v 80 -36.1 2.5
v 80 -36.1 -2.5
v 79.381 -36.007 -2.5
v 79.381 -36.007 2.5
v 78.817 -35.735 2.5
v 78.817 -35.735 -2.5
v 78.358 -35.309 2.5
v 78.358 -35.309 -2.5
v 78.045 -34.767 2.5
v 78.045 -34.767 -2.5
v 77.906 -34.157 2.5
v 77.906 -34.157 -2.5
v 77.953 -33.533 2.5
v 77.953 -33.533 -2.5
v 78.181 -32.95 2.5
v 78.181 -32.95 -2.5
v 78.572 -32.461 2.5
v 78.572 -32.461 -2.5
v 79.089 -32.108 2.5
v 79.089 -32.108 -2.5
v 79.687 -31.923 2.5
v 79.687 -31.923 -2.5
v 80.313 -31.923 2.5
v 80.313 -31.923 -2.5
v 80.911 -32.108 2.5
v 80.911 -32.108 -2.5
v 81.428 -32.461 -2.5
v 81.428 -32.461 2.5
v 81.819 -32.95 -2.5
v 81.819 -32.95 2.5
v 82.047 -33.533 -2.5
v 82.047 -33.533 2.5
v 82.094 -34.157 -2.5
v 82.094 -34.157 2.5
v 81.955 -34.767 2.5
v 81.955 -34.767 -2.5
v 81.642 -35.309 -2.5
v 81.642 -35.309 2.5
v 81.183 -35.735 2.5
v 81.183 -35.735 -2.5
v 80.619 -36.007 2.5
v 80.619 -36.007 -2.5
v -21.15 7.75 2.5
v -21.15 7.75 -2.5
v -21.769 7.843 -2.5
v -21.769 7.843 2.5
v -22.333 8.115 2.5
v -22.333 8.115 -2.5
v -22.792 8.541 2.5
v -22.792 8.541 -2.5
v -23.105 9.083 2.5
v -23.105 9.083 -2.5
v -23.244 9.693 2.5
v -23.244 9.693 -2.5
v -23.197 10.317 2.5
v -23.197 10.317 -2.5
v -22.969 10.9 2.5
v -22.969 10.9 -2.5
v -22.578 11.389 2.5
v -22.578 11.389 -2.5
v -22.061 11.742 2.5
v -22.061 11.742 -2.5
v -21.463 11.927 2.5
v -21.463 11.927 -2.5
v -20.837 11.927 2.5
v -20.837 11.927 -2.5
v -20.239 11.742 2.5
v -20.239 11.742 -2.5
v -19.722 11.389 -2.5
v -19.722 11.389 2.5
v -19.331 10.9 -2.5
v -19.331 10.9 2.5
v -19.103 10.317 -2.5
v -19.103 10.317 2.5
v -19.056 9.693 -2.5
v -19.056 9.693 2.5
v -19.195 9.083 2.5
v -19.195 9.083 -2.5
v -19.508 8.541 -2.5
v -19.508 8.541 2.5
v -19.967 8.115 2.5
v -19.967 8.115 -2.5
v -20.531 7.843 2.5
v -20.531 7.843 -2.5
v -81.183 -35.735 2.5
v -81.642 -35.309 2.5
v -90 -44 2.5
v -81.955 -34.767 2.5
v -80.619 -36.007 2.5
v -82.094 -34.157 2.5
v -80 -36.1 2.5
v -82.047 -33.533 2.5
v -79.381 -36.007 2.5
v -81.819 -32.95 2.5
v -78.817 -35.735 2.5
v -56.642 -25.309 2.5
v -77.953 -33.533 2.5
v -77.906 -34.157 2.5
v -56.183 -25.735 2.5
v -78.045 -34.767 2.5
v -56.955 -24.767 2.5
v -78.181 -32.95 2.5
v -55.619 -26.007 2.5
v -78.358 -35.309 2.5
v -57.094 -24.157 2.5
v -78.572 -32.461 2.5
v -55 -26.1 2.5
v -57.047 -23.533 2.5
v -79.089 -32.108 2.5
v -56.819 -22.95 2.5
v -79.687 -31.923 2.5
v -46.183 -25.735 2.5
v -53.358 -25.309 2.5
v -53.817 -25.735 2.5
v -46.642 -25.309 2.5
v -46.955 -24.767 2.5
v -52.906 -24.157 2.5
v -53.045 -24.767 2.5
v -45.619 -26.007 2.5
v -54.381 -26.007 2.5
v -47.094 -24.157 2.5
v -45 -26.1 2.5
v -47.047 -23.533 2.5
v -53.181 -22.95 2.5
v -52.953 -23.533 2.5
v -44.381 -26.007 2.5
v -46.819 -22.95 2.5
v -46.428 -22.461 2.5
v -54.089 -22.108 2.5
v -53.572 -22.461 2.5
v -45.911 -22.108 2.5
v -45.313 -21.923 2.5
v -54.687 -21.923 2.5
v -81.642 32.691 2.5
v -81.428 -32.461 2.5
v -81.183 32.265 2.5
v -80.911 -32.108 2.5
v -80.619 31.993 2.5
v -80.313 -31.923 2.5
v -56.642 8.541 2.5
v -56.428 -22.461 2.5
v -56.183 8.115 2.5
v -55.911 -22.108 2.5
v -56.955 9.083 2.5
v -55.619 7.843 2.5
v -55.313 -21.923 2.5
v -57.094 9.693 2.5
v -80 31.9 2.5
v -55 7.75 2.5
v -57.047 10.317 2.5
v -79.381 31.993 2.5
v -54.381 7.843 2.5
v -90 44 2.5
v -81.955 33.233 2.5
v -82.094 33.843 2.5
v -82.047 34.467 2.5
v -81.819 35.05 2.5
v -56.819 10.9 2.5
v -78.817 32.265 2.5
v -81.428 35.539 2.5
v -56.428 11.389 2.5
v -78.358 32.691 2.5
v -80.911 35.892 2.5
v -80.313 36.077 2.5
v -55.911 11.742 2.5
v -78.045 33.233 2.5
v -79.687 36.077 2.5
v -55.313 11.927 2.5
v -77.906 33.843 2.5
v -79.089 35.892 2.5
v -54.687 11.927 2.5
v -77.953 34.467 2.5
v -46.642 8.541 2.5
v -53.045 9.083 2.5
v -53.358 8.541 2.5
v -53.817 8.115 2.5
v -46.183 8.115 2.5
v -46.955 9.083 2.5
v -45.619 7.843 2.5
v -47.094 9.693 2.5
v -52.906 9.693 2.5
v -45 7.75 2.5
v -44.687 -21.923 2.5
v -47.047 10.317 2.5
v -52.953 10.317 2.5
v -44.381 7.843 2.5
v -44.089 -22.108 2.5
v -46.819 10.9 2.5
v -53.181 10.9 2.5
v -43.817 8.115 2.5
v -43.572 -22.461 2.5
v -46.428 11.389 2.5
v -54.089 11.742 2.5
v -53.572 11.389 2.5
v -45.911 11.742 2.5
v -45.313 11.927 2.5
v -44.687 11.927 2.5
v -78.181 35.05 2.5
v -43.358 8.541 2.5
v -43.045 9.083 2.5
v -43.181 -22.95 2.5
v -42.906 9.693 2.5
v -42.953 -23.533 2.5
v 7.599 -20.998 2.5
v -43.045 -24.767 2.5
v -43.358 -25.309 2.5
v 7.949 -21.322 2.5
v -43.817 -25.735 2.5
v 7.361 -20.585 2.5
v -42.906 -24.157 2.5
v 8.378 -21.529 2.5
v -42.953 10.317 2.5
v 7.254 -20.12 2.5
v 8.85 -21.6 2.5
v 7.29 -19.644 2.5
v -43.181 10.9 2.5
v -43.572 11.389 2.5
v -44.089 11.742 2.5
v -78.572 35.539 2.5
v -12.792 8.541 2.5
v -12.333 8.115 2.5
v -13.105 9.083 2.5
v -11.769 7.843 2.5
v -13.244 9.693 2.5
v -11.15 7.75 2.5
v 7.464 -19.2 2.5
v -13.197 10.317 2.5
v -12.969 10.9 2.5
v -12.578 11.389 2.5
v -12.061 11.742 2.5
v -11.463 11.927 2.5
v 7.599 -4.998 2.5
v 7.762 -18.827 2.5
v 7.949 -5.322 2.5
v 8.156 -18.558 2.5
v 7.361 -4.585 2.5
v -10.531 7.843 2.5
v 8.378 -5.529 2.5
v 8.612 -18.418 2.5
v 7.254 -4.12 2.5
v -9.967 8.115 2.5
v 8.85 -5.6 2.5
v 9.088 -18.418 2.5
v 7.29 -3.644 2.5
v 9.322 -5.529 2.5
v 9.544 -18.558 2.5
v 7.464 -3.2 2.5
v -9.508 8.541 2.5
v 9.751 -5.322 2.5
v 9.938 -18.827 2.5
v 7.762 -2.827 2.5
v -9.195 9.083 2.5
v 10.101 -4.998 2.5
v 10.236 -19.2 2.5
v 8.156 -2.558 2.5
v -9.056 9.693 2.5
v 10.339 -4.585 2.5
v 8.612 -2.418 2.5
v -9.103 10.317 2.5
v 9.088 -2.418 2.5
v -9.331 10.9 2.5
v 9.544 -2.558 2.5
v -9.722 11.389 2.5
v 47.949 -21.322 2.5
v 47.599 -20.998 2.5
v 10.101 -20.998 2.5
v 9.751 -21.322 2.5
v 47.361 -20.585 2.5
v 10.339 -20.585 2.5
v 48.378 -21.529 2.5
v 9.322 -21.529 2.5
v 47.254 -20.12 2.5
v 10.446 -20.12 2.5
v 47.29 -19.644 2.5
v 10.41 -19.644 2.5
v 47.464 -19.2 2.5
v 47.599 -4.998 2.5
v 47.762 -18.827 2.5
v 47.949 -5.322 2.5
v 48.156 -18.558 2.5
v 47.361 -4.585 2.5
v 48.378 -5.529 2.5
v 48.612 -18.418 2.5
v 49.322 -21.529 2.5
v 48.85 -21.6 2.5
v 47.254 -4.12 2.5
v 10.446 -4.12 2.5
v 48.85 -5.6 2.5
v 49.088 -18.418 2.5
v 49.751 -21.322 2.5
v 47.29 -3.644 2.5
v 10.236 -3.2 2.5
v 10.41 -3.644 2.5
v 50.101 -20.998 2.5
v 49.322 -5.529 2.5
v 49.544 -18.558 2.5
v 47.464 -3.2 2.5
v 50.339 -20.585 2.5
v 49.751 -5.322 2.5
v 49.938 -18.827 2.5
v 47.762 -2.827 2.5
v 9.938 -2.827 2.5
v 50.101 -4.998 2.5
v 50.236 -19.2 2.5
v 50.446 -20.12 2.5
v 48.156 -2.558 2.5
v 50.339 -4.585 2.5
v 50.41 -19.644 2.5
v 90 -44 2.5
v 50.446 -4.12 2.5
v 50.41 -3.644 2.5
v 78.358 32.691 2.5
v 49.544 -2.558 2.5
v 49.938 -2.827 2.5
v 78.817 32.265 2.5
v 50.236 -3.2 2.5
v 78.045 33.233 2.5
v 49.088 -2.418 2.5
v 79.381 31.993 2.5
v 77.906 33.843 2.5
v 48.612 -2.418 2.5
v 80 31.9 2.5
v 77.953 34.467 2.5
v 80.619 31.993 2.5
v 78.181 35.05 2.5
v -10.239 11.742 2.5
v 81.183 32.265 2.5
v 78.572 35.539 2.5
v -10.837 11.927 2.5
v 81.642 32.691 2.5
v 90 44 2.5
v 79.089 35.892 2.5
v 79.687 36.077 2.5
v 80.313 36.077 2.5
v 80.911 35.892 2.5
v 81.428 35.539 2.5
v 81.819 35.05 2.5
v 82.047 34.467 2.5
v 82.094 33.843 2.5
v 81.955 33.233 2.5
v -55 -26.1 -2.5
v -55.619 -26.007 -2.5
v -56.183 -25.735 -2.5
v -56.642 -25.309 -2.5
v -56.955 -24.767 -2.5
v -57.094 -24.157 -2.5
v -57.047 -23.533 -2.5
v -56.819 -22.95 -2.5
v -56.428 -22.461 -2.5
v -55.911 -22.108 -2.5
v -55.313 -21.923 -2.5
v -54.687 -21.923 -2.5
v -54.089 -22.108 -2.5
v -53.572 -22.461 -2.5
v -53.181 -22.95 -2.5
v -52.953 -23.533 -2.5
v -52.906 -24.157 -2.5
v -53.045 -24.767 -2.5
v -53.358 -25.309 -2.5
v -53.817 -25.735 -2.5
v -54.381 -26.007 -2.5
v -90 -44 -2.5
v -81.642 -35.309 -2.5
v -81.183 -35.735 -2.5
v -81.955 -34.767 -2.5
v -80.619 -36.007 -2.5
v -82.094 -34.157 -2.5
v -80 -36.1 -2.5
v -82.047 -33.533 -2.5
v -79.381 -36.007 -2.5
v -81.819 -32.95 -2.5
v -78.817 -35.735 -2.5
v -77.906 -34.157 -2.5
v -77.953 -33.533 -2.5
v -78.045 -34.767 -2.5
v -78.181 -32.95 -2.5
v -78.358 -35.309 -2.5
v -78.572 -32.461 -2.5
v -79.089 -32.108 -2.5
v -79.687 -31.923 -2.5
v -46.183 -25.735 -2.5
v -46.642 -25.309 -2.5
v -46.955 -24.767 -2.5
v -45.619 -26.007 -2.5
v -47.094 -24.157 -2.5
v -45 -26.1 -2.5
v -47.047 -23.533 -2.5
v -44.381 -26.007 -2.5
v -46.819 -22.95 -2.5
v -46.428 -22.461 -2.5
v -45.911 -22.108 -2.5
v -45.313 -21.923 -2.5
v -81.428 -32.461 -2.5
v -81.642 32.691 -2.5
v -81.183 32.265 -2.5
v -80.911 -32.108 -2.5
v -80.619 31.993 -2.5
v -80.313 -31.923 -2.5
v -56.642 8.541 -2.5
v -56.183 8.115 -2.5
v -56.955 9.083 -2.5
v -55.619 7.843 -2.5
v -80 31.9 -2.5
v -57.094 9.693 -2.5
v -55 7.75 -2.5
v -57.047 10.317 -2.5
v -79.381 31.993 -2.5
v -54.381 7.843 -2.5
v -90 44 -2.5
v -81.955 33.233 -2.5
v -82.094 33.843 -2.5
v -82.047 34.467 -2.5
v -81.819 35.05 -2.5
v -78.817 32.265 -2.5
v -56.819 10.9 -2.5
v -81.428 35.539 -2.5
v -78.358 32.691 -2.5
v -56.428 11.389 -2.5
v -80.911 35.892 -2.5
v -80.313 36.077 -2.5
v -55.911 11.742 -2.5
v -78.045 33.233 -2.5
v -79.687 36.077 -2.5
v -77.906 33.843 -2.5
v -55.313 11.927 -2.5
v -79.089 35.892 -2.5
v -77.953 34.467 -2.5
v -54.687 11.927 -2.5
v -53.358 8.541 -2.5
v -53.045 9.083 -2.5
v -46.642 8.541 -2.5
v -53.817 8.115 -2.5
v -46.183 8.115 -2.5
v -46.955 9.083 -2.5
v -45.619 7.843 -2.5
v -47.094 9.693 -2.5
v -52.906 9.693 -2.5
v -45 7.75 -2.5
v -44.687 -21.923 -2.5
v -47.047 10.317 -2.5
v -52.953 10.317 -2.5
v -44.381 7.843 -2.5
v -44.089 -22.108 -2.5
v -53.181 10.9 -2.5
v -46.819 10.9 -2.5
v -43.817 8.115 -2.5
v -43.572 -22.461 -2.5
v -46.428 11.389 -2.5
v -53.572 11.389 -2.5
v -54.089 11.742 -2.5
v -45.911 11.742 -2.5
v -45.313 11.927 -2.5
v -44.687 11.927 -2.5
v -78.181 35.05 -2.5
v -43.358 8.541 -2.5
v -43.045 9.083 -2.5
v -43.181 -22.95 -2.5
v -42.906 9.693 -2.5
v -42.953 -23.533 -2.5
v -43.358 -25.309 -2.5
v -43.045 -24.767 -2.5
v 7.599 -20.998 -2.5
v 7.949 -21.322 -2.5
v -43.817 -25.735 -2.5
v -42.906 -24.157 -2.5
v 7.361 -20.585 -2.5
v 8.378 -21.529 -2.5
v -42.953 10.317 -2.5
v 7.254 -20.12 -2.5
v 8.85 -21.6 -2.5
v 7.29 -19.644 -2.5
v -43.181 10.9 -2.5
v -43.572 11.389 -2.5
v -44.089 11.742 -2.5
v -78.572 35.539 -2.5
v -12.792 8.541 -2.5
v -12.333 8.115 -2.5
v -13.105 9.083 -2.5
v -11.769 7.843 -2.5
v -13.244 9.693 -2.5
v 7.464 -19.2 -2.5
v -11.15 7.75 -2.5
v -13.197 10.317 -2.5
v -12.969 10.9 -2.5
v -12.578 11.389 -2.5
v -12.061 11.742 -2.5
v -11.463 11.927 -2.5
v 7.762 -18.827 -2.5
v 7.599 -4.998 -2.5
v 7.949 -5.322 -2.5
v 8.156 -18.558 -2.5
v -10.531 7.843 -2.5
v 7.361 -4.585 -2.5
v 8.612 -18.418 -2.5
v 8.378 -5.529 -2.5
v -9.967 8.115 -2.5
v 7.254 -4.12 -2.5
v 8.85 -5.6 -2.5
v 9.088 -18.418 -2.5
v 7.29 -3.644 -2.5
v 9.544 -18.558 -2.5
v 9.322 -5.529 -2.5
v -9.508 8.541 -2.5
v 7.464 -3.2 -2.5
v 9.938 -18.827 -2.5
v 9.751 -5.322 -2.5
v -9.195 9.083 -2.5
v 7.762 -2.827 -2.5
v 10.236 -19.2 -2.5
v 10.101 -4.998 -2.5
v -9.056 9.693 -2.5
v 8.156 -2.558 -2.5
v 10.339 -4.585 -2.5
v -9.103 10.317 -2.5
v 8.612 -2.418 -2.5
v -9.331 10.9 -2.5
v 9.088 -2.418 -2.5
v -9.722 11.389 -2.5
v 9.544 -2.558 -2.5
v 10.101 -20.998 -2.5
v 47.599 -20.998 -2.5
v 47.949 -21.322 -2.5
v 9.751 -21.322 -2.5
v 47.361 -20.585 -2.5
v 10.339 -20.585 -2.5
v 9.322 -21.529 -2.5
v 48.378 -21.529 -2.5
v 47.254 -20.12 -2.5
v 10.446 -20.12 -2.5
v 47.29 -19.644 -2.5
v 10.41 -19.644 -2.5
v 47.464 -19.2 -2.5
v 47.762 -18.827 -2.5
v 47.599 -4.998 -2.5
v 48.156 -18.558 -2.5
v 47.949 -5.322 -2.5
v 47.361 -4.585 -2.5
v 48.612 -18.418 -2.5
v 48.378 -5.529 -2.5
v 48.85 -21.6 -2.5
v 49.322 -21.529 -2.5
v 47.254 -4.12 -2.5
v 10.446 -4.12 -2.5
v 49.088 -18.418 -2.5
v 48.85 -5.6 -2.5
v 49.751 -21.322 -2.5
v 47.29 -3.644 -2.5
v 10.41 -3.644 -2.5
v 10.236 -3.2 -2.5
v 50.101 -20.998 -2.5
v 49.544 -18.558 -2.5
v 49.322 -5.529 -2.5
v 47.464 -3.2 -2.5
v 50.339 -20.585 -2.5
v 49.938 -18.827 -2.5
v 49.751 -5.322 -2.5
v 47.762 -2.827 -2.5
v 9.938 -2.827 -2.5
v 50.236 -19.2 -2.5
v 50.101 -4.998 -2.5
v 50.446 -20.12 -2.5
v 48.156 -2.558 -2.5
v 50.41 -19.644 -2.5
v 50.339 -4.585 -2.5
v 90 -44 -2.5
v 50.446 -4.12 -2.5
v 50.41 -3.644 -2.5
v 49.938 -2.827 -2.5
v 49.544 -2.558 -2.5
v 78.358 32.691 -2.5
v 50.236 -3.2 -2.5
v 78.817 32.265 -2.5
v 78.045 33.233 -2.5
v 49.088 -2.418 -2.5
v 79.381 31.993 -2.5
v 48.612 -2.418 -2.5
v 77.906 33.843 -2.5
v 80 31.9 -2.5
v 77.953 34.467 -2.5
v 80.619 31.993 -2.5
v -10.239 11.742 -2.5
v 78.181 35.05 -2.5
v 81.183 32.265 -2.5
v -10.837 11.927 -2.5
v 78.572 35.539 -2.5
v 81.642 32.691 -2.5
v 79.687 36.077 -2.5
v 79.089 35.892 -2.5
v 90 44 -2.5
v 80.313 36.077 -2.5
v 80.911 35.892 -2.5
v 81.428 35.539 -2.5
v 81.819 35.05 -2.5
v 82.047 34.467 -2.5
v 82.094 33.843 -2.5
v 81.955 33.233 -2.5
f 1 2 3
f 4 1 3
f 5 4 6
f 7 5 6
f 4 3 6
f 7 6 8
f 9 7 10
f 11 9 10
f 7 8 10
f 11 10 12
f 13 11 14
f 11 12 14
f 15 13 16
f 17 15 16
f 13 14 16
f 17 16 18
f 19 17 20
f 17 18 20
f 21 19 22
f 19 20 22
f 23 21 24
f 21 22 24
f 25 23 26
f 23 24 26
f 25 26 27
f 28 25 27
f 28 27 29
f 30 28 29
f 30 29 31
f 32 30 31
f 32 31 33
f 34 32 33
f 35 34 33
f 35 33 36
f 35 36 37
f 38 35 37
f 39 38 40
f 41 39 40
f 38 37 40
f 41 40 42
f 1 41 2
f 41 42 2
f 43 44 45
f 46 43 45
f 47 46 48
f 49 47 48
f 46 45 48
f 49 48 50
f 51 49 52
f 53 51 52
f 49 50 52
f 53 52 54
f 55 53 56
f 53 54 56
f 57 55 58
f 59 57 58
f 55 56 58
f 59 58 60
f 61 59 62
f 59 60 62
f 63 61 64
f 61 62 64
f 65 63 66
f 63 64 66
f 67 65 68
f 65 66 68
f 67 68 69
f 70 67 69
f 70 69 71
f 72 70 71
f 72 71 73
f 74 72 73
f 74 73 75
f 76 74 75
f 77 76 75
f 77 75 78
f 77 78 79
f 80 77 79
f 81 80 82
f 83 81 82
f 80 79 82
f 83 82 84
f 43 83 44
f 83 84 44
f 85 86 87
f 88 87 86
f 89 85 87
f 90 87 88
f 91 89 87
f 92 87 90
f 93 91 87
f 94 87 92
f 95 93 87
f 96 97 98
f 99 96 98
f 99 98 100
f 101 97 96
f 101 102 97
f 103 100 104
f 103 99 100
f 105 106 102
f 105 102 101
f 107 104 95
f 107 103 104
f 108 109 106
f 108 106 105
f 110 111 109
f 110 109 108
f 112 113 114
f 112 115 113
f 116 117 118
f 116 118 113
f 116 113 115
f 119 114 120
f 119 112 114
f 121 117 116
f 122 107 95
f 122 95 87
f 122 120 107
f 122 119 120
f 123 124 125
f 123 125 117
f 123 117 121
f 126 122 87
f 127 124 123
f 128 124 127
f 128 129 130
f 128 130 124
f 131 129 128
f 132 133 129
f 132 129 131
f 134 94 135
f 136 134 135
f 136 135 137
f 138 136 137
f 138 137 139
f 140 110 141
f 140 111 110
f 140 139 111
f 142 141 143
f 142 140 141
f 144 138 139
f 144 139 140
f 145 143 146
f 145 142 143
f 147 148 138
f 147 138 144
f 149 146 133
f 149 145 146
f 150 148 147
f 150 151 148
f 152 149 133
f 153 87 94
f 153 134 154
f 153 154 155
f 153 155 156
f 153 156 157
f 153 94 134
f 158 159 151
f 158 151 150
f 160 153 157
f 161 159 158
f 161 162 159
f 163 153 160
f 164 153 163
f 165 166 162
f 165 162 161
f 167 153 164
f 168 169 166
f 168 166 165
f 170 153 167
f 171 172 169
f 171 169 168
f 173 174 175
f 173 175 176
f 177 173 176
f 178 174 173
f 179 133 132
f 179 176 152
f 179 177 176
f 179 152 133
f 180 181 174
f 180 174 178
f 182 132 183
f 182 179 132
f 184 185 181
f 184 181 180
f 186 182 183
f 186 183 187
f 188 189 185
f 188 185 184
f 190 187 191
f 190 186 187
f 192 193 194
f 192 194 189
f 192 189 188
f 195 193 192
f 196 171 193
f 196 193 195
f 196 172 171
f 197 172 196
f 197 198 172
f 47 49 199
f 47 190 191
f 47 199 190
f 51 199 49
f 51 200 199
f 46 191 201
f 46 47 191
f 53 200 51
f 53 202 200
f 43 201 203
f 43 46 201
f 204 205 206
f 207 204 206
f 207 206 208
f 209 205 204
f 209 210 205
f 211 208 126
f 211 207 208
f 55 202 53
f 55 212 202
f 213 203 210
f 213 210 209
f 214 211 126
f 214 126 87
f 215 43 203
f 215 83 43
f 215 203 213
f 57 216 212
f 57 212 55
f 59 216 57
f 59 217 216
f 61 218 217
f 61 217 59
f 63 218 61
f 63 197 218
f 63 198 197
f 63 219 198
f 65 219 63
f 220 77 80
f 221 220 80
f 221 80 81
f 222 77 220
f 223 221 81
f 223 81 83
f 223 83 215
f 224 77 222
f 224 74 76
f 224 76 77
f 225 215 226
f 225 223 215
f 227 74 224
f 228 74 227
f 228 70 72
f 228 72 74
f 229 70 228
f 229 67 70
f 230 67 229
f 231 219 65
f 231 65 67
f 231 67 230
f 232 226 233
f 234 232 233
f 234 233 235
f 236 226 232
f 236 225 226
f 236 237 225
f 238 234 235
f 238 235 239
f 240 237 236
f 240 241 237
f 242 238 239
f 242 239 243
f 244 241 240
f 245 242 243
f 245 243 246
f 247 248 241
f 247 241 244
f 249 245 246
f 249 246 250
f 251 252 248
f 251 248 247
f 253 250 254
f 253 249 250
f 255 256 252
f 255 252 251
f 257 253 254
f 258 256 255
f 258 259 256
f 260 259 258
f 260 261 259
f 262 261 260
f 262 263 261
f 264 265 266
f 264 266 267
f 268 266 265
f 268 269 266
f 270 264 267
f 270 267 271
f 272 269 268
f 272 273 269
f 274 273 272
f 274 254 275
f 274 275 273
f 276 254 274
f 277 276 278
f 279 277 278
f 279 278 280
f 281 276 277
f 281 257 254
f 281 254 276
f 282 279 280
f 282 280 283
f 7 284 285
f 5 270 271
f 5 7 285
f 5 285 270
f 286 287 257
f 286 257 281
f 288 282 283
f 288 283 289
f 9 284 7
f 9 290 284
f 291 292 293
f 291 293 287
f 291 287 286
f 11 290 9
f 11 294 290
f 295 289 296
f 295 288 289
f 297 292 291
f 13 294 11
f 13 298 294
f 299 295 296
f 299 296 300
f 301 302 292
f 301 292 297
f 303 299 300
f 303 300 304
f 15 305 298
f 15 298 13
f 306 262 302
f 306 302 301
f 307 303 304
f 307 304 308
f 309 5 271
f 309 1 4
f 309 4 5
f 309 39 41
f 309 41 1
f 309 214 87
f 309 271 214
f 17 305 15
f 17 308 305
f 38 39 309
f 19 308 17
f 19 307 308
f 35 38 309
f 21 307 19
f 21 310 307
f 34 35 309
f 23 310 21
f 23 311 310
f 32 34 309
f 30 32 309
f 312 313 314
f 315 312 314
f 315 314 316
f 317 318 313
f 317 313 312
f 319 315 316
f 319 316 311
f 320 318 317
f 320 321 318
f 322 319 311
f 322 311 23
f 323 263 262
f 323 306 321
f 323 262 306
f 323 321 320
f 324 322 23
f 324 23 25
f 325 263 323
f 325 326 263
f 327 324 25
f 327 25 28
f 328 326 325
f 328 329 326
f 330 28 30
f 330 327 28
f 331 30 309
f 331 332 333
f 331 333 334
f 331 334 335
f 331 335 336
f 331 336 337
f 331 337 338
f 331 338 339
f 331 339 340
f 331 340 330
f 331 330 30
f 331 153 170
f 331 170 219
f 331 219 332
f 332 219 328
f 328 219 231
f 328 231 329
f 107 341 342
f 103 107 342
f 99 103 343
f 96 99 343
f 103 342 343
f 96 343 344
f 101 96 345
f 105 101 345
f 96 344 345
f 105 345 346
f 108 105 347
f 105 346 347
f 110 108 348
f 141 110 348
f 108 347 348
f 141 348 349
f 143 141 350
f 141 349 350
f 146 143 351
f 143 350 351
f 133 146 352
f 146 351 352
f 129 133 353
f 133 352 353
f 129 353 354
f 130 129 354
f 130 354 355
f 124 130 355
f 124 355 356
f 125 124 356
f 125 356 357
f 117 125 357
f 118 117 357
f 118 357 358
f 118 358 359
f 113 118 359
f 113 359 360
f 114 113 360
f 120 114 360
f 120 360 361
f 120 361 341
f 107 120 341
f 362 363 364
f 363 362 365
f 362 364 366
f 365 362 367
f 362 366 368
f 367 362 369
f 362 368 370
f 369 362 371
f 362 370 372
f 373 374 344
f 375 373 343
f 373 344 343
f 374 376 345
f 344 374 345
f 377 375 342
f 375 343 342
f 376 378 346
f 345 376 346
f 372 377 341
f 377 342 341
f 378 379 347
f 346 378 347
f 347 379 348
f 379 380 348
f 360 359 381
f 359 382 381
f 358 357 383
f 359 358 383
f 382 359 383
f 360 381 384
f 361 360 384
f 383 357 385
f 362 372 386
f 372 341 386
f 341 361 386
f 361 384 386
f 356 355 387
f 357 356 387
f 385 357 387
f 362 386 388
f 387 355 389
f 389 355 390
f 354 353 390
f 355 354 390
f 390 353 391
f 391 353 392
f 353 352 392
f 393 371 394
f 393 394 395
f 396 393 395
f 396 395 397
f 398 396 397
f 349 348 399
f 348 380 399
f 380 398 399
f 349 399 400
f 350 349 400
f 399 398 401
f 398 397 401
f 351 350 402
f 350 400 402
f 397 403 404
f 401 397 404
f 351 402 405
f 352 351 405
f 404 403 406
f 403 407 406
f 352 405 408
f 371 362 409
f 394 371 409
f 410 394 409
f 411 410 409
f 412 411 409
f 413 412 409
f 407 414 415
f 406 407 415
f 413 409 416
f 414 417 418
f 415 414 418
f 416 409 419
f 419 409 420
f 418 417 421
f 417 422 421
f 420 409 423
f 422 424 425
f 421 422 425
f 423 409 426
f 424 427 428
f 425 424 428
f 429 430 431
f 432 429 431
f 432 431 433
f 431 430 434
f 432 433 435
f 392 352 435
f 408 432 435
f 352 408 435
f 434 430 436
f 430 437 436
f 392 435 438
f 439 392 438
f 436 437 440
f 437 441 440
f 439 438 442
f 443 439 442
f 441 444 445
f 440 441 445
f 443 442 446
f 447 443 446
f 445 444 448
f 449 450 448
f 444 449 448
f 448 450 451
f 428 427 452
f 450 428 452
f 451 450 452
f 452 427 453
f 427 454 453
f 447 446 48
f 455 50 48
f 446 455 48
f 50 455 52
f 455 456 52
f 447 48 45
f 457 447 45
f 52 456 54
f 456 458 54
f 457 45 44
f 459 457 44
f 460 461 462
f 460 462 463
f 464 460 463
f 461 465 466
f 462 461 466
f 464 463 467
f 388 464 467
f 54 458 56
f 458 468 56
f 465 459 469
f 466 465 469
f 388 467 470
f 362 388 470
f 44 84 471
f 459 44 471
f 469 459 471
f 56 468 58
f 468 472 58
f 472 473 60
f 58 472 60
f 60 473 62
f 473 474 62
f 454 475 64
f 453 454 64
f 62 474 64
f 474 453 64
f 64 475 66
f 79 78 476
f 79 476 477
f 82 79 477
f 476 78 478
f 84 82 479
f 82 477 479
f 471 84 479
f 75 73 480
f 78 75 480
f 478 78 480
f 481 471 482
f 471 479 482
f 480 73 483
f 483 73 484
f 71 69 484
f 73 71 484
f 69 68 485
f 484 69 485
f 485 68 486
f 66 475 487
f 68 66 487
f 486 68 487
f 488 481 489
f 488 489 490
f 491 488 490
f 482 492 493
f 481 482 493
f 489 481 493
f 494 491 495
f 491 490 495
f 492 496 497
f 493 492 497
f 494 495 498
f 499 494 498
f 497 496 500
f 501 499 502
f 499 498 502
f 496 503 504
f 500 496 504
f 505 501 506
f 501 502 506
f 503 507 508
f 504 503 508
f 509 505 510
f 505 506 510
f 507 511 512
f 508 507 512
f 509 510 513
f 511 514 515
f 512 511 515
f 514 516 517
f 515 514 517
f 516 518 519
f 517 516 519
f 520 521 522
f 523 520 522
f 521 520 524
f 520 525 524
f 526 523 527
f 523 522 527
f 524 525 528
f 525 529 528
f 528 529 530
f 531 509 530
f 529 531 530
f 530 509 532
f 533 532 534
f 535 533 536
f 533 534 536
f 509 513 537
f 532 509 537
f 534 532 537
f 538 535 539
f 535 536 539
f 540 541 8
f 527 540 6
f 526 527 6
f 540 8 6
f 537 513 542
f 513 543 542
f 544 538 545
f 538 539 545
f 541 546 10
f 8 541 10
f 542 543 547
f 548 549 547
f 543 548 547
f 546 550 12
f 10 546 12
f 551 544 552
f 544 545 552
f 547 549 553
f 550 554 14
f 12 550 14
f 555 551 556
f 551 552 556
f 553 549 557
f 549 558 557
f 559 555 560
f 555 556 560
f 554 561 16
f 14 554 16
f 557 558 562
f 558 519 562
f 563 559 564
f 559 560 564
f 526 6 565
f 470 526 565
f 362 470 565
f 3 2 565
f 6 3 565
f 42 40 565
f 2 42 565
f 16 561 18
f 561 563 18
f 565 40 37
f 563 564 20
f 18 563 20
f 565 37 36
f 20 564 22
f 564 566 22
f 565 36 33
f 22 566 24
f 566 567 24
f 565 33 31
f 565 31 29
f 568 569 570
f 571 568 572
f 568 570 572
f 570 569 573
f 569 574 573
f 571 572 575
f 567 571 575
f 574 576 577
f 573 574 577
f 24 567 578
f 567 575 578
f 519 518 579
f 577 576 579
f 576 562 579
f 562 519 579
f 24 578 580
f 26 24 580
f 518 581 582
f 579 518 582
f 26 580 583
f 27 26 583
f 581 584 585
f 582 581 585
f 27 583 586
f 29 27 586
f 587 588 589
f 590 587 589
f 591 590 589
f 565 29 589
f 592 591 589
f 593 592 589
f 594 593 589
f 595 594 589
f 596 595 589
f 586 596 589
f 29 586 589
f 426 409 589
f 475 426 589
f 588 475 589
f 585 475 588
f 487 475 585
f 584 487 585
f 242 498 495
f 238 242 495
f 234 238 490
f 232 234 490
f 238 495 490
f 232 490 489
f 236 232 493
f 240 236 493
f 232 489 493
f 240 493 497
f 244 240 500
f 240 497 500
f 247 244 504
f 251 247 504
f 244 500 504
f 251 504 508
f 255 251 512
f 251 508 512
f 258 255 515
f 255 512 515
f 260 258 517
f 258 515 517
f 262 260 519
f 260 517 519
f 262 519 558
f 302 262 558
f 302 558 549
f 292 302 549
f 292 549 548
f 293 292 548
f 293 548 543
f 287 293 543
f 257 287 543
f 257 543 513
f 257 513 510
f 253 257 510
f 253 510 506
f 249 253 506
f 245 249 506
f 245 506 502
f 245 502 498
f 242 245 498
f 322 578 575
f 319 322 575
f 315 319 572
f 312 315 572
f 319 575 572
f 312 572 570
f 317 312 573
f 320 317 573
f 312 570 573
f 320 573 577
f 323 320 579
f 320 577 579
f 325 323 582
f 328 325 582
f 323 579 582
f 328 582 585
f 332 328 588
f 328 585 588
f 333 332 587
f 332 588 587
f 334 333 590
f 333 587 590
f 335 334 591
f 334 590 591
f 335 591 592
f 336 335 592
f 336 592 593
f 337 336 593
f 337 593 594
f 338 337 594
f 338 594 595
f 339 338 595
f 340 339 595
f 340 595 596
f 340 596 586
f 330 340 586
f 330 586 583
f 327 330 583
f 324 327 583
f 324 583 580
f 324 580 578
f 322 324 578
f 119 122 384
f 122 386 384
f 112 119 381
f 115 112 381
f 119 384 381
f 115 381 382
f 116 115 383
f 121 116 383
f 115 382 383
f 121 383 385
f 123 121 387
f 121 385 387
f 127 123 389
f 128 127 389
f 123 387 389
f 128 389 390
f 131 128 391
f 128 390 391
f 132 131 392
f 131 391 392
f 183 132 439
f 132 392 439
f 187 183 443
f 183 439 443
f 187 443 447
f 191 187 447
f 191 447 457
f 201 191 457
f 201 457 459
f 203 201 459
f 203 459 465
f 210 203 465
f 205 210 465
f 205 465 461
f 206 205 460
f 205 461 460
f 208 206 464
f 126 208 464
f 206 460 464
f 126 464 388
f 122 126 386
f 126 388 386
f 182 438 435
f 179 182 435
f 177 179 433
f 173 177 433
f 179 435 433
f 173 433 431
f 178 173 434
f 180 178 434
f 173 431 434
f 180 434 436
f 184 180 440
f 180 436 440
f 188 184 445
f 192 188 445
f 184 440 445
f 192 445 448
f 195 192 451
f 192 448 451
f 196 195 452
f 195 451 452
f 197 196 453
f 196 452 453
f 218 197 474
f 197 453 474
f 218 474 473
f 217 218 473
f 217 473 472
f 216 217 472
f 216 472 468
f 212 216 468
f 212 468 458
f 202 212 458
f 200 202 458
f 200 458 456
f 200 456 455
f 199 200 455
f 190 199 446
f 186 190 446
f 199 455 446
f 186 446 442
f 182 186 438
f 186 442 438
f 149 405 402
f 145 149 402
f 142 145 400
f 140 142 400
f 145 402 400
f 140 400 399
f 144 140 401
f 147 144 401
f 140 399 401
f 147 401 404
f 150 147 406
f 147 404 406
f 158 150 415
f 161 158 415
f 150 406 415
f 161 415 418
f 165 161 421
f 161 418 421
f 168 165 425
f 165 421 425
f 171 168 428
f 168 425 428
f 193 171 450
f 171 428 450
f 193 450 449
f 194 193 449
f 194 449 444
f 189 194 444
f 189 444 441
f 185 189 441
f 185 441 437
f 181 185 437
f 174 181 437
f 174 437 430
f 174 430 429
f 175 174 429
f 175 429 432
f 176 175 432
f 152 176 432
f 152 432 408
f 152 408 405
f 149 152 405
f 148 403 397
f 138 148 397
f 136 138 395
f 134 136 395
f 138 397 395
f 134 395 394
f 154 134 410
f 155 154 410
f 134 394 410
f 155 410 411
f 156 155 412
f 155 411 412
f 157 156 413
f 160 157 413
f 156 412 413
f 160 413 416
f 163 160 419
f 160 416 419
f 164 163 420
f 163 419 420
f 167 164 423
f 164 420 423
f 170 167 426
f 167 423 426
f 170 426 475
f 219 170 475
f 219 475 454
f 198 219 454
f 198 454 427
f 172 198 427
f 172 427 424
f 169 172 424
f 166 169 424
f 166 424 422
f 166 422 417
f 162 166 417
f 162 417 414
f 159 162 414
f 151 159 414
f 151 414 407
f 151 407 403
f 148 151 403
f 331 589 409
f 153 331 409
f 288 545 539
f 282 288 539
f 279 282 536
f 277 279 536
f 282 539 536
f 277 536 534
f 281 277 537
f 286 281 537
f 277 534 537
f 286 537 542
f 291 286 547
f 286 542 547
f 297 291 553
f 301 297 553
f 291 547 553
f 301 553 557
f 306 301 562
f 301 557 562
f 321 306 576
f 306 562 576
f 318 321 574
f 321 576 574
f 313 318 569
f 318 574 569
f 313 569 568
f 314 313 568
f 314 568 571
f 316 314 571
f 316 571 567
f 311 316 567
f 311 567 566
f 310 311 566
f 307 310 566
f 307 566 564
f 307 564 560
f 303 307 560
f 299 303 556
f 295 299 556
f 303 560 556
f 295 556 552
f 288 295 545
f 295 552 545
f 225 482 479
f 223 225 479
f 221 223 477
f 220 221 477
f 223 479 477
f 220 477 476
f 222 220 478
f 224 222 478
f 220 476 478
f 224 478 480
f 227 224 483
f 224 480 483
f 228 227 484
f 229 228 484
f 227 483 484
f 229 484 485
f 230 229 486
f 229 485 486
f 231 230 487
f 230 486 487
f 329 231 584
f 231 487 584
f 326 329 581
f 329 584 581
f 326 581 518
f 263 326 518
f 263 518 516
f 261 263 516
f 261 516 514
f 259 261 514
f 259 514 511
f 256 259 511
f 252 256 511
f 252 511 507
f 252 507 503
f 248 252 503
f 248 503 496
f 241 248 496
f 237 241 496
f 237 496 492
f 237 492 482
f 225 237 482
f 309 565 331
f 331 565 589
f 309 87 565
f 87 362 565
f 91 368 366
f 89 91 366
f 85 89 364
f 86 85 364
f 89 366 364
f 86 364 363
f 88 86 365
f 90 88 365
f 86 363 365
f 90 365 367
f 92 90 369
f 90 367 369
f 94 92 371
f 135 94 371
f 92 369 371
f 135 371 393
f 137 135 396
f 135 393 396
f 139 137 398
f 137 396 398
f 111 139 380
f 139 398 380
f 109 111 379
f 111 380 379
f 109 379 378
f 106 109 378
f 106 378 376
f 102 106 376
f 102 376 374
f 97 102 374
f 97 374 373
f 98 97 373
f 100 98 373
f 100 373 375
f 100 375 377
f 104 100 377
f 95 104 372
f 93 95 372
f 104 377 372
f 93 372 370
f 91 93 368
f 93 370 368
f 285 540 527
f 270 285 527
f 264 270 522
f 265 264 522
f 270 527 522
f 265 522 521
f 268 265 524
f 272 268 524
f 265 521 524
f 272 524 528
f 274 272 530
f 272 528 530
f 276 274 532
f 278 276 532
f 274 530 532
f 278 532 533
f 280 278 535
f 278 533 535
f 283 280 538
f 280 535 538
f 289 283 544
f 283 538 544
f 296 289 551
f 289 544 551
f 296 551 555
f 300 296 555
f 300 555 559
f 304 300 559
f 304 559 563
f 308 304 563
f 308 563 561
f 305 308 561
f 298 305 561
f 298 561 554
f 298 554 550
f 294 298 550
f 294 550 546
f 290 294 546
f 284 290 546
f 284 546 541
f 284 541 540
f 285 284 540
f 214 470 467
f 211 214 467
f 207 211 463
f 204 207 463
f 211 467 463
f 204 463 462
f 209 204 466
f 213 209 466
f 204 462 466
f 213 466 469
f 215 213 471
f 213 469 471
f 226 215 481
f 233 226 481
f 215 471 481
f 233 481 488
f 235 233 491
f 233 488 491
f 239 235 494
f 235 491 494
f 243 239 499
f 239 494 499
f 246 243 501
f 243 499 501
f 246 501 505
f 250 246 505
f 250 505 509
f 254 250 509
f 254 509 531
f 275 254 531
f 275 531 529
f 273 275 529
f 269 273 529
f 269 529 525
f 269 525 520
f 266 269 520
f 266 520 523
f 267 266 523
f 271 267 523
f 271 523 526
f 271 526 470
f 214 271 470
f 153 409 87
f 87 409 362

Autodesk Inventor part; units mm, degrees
ref_plane "YZ Plane" through (0, 0, 0) normal (1, 0, 0) x (0, 1, 0)
ref_plane "XZ Plane" through (0, 0, 0) normal (0, 1, 0) x (-1, 0, 0)
ref_plane "XY Plane" through (0, 0, 0) normal (0, 0, 1) x (1, 0, 0)
sketch "Esquisse1" plane through (0, 0, 0) normal (0, 0, 1) x (1, 0, 0)
  line L0 (-90, -44) -> (90, -44)
  line L1 (90, -44) -> (90, 44)
  line L2 (90, 44) -> (-90, 44)
  line L3 (-90, 44) -> (-90, -44)
  line L4 (-90, -44) -> (90, 44) construction
  line L5 (90, -44) -> (-90, 44) construction
  point P0 (0, 0)
  dimension "d0" = 180
  dimension "d1" = 88
extrude "Extrusion1" add sketch "Esquisse1" along normal mid plane 5
sketch "Esquisse2" plane through (0, 0, 2.5) normal (0, 0, 1) x (1, 0, 0)
  line L0 (-90, 44) -> (-90, -44) projected
  line L1 (90, -44) -> (-90, -44) projected
  point P0 (0, 0)
  point P1 (-45, -24)
  point P2 (-45, 9.85)
  point P3 (-11.15, 9.85)
  dimension "d4" = 33.85
  dimension "d5" = 45
  dimension "d6" = 33.85
  dimension "d7" = 20
hole "Perçage_moteur" at (-45, -24, 2.5) at (-45, 9.85, 2.5) at (-11.15, 9.85, 2.5) direction (0, 0, -1) diameter 4.2 end through all
sketch "Esquisse3" plane through (0, 0, 2.5) normal (0, 0, 1) x (1, 0, 0)
  line L0 (-60.0266, -12) -> (31.1582, -12) construction
  circle A0 centre (-45, -24) radius 2.1 construction
  circle A1 centre (-11.15, 9.85) radius 2.1 construction
  line L1 (-90, 44) -> (-90, -44) projected
  point P0 (0, 0)
  point P1 (8.85, -20)
  point P2 (8.85, -4)
  point P3 (48.85, -4)
  point P4 (48.85, -20)
  dimension "d15" = 40
  dimension "d16" = 16
  dimension "d17" = 12
  dimension "d18" = 8
  dimension "d19" = 20
  dimension "d38" = 98.85
hole "Perçage_laser" at (8.85, -20, 2.5) at (8.85, -4, 2.5) at (48.85, -4, 2.5) at (48.85, -20, 2.5) direction (0, 0, -1) diameter 3.2 depth 9.525 tip angle 118
sketch "Esquisse4" plane through (0, 0, 2.5) normal (0, 0, 1) x (1, 0, 0)
  line L0 (90, -44) -> (90, 44) projected
  line L1 (-90, 44) -> (90, 44) projected
  line L2 (90, -44) -> (-90, -44) projected
  line L3 (-90, 44) -> (-90, -44) projected
  point P0 (0, 0)
  point P1 (-80, -34)
  point P2 (-80, 34)
  point P3 (80, 34)
  point P4 (80, -34)
  dimension "d27" = 10
  dimension "d28" = 10
  dimension "d29" = 10
  dimension "d30" = 10
hole "Perçage_coins" at (-80, -34, 2.5) at (-80, 34, 2.5) at (80, 34, 2.5) at (80, -34, 2.5) direction (0, 0, -1) diameter 4.2 depth 9.525 tip angle 118
sketch "Esquisse5" plane through (0, 0, 2.5) normal (0, 0, 1) x (1, 0, 0)
  circle A0 centre (-45, 9.85) radius 2.1 projected
  circle A1 centre (-11.15, 9.85) radius 2.1 projected
  circle A2 centre (-45, -24) radius 2.1 projected
  point P0 (0, 0)
  point P1 (-55, -24)
  point P2 (-55, 9.85)
  point P3 (-21.15, 9.85)
  dimension "d39" = 10
  dimension "d40" = 10
  dimension "d41" = 10
hole "Perçage4" at (-55, -24, 2.5) at (-55, 9.85, 2.5) at (-21.15, 9.85, 2.5) direction (0, 0, -1) diameter 4.2 depth 8 tip angle 118
equation "\"d18\" = 0.5 * d16"
equation "\"pi\" = 3.141593"
equation "\"nombredor\" = 1.61803"
properties part number "Plaque support" material "Aluminium 6061"
